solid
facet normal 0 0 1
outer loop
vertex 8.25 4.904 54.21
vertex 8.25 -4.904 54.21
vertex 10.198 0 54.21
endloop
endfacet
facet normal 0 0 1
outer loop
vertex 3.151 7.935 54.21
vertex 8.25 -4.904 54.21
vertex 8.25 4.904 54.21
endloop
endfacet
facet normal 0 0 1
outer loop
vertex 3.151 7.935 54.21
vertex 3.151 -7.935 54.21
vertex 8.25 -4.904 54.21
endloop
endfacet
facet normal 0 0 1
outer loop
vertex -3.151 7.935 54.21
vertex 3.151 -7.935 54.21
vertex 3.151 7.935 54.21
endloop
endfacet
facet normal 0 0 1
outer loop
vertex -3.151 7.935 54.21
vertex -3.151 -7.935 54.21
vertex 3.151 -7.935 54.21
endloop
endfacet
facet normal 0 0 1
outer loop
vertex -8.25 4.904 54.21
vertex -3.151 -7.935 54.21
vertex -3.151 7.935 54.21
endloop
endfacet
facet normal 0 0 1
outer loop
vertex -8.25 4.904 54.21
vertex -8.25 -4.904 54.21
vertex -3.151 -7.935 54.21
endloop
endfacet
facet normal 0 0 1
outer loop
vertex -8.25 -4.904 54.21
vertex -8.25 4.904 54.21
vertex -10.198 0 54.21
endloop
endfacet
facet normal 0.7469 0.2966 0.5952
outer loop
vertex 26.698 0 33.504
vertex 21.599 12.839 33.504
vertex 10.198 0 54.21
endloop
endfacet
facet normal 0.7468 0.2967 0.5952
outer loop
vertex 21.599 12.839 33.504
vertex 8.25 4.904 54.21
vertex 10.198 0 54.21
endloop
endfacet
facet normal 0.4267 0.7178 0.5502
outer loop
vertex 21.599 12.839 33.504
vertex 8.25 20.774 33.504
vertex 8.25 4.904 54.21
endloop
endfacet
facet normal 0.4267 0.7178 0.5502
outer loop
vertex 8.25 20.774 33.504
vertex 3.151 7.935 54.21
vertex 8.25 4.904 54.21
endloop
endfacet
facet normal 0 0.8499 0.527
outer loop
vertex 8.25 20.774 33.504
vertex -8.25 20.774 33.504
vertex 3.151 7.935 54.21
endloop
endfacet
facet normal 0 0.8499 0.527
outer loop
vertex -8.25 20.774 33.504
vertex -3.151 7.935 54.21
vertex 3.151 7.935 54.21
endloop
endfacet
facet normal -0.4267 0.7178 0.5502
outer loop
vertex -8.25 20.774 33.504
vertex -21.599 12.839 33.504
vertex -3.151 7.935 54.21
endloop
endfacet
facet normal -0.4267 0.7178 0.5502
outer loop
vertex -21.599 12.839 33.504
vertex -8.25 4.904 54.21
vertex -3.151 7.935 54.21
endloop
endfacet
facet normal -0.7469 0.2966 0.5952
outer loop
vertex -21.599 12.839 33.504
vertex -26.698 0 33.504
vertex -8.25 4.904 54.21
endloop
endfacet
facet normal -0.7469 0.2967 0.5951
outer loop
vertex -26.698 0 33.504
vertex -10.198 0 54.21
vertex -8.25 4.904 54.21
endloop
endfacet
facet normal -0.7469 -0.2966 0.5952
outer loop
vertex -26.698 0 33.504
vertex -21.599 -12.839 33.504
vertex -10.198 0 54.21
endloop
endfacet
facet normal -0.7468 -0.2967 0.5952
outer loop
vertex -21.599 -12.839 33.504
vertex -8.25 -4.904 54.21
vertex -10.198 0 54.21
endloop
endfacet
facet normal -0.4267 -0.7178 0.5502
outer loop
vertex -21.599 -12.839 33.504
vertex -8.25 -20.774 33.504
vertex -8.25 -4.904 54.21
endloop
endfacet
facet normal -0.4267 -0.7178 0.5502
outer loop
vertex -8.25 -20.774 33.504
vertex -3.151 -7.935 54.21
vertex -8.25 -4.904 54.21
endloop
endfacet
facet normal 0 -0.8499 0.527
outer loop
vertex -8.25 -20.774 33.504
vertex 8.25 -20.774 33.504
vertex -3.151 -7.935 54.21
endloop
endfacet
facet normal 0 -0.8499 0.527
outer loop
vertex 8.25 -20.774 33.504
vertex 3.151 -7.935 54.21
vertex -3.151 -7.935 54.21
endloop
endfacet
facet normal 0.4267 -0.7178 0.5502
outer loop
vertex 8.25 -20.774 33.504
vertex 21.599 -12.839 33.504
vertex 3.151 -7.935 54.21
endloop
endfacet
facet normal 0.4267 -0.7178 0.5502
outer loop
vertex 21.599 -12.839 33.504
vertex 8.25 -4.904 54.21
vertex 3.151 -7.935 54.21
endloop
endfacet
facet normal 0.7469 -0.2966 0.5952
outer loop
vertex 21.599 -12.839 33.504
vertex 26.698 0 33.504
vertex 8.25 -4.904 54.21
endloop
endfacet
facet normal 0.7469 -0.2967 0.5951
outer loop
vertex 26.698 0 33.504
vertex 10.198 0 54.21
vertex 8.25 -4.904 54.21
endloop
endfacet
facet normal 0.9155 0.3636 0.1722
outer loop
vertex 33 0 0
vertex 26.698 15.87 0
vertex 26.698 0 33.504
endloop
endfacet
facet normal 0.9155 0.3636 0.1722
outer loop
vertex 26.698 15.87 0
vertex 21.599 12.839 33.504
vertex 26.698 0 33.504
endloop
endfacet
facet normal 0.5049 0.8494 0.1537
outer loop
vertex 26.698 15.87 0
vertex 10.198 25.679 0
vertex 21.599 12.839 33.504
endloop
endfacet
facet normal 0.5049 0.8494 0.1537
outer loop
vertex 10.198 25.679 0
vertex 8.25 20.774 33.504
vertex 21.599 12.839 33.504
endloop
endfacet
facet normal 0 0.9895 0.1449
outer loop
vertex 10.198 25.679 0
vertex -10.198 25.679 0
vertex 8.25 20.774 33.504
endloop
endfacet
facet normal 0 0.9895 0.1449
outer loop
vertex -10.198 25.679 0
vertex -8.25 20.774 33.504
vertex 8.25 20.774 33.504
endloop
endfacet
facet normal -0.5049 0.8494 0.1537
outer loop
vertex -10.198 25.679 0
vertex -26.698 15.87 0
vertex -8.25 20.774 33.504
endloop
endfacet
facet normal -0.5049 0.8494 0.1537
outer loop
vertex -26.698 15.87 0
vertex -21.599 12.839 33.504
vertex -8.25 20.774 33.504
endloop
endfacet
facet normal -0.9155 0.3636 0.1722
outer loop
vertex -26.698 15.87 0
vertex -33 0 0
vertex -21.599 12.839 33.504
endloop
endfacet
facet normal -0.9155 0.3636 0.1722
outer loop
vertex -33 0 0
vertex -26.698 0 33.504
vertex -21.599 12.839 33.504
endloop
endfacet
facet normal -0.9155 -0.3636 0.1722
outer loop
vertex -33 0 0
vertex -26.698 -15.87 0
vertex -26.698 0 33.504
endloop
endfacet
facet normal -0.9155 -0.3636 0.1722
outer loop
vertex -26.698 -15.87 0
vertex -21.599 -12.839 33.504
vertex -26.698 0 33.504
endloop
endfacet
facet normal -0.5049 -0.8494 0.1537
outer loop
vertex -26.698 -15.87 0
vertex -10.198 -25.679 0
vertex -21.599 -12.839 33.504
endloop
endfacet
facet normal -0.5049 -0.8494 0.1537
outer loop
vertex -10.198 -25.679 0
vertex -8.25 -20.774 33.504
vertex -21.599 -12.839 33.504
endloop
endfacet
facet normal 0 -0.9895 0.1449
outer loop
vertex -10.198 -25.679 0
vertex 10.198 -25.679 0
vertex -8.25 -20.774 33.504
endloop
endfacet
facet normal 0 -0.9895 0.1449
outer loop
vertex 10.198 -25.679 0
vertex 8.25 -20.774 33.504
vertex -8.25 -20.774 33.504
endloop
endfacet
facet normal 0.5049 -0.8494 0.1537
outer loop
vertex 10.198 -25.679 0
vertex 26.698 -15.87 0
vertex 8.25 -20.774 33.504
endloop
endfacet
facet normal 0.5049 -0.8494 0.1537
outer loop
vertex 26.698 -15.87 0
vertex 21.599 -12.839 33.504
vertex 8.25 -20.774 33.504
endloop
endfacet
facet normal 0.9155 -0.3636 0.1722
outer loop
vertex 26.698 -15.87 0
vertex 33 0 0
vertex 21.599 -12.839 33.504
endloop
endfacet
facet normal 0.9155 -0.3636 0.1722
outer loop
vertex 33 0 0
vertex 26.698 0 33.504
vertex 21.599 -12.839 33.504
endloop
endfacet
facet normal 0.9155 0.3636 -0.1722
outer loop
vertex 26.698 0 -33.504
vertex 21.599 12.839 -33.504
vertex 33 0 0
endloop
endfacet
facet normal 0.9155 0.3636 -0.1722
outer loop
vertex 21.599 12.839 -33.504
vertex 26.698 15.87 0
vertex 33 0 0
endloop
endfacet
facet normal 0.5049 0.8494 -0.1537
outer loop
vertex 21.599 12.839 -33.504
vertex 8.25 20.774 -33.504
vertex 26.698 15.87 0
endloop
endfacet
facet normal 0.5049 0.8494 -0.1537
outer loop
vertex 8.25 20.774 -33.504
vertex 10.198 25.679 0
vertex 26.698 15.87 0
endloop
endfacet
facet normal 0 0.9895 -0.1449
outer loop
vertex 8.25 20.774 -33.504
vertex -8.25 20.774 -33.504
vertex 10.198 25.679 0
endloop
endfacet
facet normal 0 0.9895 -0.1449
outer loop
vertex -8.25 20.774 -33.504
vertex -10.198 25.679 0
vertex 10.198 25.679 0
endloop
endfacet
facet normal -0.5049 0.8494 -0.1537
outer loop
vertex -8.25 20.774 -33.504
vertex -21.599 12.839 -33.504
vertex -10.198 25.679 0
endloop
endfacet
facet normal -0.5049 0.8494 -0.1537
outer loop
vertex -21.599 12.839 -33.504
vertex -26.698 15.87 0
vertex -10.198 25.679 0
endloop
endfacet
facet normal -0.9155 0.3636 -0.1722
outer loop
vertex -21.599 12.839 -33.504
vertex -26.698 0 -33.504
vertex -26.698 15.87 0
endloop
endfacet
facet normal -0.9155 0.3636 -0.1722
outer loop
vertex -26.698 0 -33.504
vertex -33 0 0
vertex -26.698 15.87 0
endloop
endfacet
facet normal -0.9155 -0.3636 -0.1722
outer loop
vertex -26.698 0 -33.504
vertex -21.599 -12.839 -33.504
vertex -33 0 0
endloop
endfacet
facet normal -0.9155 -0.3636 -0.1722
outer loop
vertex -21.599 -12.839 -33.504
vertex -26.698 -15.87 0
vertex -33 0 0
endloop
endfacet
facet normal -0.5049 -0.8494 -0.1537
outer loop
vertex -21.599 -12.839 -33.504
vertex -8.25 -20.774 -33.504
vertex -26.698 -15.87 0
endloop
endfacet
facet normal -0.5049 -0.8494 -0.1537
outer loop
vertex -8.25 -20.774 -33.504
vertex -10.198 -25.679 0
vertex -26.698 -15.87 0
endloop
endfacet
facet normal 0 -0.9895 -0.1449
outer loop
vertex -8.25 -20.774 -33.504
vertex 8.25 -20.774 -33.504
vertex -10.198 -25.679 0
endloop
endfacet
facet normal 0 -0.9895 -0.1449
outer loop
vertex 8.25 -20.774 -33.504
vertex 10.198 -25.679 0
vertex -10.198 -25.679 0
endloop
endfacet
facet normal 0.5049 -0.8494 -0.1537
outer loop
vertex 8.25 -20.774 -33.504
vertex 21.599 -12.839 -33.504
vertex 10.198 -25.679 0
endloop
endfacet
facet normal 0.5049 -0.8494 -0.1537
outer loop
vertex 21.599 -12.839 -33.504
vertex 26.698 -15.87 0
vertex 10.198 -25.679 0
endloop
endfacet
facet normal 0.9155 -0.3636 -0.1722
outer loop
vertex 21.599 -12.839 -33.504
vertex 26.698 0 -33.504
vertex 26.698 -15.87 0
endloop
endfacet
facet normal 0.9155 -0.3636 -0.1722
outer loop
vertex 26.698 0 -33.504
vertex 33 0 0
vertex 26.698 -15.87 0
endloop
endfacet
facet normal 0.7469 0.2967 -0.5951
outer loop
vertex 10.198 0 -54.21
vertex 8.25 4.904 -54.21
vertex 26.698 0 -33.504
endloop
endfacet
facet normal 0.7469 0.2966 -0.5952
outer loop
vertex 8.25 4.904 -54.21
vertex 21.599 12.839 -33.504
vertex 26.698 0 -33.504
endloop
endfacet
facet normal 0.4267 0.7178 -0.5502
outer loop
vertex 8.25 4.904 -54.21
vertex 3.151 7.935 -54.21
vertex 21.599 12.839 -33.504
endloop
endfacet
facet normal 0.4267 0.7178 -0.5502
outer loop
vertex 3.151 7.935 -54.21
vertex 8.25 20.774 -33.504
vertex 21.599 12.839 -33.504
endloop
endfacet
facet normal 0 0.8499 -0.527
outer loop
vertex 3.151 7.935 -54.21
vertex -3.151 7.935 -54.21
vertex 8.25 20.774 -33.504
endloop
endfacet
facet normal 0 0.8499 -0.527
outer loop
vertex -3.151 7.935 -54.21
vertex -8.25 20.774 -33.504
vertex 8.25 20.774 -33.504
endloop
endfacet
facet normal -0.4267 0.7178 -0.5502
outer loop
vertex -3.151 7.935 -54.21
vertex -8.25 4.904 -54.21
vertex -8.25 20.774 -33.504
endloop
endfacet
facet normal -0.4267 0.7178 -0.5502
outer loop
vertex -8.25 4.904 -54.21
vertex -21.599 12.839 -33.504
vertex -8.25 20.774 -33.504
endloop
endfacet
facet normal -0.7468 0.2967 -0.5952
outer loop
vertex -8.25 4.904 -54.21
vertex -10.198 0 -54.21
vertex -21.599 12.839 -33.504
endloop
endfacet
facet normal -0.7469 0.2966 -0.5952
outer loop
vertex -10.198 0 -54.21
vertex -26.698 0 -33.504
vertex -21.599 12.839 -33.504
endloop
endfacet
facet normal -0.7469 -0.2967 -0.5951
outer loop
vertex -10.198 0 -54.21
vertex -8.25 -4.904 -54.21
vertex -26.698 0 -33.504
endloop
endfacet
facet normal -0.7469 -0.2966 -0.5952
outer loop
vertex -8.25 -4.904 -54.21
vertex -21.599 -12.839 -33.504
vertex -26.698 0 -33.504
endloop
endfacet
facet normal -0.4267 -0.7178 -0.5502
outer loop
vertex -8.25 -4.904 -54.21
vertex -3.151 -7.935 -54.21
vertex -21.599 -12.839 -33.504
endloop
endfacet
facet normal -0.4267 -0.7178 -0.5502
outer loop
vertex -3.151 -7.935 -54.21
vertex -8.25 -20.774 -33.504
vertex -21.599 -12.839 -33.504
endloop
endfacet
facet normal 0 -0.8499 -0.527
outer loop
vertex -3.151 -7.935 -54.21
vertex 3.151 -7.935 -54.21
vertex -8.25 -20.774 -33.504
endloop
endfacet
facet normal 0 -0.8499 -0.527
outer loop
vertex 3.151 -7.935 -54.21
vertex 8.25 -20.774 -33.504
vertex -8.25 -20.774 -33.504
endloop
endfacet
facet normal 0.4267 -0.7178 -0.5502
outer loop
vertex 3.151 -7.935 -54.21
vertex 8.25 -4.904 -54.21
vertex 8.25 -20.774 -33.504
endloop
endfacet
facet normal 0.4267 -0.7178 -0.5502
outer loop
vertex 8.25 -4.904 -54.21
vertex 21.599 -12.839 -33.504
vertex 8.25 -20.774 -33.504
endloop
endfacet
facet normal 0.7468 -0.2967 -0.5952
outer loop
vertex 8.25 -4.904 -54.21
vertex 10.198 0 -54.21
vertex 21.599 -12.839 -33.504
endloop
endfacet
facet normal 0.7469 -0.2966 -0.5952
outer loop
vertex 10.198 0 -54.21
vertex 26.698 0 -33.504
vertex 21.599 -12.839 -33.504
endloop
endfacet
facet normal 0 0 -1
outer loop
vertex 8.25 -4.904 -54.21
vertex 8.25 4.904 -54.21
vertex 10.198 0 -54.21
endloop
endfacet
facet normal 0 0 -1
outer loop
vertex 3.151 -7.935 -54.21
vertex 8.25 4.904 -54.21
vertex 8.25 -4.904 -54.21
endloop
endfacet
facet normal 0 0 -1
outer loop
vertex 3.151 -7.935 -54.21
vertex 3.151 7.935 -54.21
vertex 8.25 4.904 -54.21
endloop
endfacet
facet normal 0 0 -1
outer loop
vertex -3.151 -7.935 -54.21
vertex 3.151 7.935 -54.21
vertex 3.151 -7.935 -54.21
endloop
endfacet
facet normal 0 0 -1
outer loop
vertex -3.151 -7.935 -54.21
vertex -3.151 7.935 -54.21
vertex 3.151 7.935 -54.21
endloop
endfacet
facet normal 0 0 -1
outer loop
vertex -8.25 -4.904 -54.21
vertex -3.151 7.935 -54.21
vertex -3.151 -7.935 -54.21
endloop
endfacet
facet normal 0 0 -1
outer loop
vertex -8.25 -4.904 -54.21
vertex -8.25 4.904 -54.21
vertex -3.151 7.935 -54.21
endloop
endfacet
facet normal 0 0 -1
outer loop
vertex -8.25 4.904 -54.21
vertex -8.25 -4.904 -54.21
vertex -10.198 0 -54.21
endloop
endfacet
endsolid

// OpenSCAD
// Generated by SolidPython 1.0.1 on 2020-07-29 00:46:49


scale(v = [11, 9, 19]) {
	sphere(r = 3);
}
/***********************************************
*********      SolidPython code:      **********
************************************************
 
# import packages: SolidPython
from solid import *
from solid.utils import *
from itertools import chain, combinations, permutations


class Resize:

    def __init__(self, scad_file):
        self.scad_file = scad_file
        #self.scad_file = import_scad(scad_file)
        # cone/cylinder param:
        self.r1 = 0
        self.r2 = 0
        self.h = 0
        # rectangular prism param:
        self.w = 0
        self.l = 0
        # ellipse param:
        self.r = 0

    # import OpenScad code (file name corresponds to shape)


    # classify shape + parameters
    def assign(self, param1, param2, param3):
        if self.scad_file == 'cone.scad':
            self.r1 = param1
            self.r2 = param2
            self.h = param3
        elif self.scad_file == 'cylinder.scad':
            self.r1 = param1
            self.r2 = param2
            self.h = param3
        elif self.scad_file == 'rectangularPrism.scad':
            self.h = param1
            self.l = param2
            self.w = param3
        else:
            self.r = param1
            self.h = param2

    # resize parameters
    def iterate(self):
        x = range(3, 20, 2)
        i = 1
        if self.scad_file == 'cone.scad':
            tempList = list(permutations(x, 2))
            for temp in tempList:
                param1 = temp[0]
                param2 = temp[1]
                filepath = 'produced_scad_files/' + 'cone' + str(param1) + '_' + str(param2) + '_' + '.scad'
                scad_render_to_file(cylinder(h=param1, r1=param2, r2=0), filepath)

        elif self.scad_file == 'cylinder.scad':
            tempList = list(permutations(x, 3))
            for temp in tempList:
                param1 = temp[0]
                param2 = temp[1]
                filepath = 'produced_scad_files/' + 'cylinder' + str(param1) + '_' + str(param2) + '_' + '.scad'
                scad_render_to_file(cylinder(h=param1, r1=param2, r2=param2), filepath)

        elif self.scad_file == 'rectangularPrism.scad':
            tempList = list(permutations(x, 3))
            for temp in tempList:
                param1 = temp[0]
                param2 = temp[1]
                param3 = temp[2]
                filepath = 'produced_scad_files/' + 'rectangularPrism' + str(param1) + '_' + str(param2) + '_' + str(
                    param3) + '.scad'
                scad_render_to_file(cube(size=(param1, param2, param3)), filepath)

        elif self.scad_file == 'ellipse.scad':
            tempList = list(permutations(x, 4))
            for temp in tempList:
                param1 = temp[0]
                param2 = temp[1]
                param3 = temp[2]
                param4 = temp[3]
                filepath = 'produced_scad_files/' + 'ellipse' + str(param1) + '_' + str(param2) + '_' + str(param3) + '_' + str(param4) + '.scad'
                scad_render_to_file(scale([param1, param2, param3])(sphere(r=param4)), filepath)

    def render_to_scadfile(self):
        scad_render_to_file(scad, 'example.scad') 
 
************************************************/
